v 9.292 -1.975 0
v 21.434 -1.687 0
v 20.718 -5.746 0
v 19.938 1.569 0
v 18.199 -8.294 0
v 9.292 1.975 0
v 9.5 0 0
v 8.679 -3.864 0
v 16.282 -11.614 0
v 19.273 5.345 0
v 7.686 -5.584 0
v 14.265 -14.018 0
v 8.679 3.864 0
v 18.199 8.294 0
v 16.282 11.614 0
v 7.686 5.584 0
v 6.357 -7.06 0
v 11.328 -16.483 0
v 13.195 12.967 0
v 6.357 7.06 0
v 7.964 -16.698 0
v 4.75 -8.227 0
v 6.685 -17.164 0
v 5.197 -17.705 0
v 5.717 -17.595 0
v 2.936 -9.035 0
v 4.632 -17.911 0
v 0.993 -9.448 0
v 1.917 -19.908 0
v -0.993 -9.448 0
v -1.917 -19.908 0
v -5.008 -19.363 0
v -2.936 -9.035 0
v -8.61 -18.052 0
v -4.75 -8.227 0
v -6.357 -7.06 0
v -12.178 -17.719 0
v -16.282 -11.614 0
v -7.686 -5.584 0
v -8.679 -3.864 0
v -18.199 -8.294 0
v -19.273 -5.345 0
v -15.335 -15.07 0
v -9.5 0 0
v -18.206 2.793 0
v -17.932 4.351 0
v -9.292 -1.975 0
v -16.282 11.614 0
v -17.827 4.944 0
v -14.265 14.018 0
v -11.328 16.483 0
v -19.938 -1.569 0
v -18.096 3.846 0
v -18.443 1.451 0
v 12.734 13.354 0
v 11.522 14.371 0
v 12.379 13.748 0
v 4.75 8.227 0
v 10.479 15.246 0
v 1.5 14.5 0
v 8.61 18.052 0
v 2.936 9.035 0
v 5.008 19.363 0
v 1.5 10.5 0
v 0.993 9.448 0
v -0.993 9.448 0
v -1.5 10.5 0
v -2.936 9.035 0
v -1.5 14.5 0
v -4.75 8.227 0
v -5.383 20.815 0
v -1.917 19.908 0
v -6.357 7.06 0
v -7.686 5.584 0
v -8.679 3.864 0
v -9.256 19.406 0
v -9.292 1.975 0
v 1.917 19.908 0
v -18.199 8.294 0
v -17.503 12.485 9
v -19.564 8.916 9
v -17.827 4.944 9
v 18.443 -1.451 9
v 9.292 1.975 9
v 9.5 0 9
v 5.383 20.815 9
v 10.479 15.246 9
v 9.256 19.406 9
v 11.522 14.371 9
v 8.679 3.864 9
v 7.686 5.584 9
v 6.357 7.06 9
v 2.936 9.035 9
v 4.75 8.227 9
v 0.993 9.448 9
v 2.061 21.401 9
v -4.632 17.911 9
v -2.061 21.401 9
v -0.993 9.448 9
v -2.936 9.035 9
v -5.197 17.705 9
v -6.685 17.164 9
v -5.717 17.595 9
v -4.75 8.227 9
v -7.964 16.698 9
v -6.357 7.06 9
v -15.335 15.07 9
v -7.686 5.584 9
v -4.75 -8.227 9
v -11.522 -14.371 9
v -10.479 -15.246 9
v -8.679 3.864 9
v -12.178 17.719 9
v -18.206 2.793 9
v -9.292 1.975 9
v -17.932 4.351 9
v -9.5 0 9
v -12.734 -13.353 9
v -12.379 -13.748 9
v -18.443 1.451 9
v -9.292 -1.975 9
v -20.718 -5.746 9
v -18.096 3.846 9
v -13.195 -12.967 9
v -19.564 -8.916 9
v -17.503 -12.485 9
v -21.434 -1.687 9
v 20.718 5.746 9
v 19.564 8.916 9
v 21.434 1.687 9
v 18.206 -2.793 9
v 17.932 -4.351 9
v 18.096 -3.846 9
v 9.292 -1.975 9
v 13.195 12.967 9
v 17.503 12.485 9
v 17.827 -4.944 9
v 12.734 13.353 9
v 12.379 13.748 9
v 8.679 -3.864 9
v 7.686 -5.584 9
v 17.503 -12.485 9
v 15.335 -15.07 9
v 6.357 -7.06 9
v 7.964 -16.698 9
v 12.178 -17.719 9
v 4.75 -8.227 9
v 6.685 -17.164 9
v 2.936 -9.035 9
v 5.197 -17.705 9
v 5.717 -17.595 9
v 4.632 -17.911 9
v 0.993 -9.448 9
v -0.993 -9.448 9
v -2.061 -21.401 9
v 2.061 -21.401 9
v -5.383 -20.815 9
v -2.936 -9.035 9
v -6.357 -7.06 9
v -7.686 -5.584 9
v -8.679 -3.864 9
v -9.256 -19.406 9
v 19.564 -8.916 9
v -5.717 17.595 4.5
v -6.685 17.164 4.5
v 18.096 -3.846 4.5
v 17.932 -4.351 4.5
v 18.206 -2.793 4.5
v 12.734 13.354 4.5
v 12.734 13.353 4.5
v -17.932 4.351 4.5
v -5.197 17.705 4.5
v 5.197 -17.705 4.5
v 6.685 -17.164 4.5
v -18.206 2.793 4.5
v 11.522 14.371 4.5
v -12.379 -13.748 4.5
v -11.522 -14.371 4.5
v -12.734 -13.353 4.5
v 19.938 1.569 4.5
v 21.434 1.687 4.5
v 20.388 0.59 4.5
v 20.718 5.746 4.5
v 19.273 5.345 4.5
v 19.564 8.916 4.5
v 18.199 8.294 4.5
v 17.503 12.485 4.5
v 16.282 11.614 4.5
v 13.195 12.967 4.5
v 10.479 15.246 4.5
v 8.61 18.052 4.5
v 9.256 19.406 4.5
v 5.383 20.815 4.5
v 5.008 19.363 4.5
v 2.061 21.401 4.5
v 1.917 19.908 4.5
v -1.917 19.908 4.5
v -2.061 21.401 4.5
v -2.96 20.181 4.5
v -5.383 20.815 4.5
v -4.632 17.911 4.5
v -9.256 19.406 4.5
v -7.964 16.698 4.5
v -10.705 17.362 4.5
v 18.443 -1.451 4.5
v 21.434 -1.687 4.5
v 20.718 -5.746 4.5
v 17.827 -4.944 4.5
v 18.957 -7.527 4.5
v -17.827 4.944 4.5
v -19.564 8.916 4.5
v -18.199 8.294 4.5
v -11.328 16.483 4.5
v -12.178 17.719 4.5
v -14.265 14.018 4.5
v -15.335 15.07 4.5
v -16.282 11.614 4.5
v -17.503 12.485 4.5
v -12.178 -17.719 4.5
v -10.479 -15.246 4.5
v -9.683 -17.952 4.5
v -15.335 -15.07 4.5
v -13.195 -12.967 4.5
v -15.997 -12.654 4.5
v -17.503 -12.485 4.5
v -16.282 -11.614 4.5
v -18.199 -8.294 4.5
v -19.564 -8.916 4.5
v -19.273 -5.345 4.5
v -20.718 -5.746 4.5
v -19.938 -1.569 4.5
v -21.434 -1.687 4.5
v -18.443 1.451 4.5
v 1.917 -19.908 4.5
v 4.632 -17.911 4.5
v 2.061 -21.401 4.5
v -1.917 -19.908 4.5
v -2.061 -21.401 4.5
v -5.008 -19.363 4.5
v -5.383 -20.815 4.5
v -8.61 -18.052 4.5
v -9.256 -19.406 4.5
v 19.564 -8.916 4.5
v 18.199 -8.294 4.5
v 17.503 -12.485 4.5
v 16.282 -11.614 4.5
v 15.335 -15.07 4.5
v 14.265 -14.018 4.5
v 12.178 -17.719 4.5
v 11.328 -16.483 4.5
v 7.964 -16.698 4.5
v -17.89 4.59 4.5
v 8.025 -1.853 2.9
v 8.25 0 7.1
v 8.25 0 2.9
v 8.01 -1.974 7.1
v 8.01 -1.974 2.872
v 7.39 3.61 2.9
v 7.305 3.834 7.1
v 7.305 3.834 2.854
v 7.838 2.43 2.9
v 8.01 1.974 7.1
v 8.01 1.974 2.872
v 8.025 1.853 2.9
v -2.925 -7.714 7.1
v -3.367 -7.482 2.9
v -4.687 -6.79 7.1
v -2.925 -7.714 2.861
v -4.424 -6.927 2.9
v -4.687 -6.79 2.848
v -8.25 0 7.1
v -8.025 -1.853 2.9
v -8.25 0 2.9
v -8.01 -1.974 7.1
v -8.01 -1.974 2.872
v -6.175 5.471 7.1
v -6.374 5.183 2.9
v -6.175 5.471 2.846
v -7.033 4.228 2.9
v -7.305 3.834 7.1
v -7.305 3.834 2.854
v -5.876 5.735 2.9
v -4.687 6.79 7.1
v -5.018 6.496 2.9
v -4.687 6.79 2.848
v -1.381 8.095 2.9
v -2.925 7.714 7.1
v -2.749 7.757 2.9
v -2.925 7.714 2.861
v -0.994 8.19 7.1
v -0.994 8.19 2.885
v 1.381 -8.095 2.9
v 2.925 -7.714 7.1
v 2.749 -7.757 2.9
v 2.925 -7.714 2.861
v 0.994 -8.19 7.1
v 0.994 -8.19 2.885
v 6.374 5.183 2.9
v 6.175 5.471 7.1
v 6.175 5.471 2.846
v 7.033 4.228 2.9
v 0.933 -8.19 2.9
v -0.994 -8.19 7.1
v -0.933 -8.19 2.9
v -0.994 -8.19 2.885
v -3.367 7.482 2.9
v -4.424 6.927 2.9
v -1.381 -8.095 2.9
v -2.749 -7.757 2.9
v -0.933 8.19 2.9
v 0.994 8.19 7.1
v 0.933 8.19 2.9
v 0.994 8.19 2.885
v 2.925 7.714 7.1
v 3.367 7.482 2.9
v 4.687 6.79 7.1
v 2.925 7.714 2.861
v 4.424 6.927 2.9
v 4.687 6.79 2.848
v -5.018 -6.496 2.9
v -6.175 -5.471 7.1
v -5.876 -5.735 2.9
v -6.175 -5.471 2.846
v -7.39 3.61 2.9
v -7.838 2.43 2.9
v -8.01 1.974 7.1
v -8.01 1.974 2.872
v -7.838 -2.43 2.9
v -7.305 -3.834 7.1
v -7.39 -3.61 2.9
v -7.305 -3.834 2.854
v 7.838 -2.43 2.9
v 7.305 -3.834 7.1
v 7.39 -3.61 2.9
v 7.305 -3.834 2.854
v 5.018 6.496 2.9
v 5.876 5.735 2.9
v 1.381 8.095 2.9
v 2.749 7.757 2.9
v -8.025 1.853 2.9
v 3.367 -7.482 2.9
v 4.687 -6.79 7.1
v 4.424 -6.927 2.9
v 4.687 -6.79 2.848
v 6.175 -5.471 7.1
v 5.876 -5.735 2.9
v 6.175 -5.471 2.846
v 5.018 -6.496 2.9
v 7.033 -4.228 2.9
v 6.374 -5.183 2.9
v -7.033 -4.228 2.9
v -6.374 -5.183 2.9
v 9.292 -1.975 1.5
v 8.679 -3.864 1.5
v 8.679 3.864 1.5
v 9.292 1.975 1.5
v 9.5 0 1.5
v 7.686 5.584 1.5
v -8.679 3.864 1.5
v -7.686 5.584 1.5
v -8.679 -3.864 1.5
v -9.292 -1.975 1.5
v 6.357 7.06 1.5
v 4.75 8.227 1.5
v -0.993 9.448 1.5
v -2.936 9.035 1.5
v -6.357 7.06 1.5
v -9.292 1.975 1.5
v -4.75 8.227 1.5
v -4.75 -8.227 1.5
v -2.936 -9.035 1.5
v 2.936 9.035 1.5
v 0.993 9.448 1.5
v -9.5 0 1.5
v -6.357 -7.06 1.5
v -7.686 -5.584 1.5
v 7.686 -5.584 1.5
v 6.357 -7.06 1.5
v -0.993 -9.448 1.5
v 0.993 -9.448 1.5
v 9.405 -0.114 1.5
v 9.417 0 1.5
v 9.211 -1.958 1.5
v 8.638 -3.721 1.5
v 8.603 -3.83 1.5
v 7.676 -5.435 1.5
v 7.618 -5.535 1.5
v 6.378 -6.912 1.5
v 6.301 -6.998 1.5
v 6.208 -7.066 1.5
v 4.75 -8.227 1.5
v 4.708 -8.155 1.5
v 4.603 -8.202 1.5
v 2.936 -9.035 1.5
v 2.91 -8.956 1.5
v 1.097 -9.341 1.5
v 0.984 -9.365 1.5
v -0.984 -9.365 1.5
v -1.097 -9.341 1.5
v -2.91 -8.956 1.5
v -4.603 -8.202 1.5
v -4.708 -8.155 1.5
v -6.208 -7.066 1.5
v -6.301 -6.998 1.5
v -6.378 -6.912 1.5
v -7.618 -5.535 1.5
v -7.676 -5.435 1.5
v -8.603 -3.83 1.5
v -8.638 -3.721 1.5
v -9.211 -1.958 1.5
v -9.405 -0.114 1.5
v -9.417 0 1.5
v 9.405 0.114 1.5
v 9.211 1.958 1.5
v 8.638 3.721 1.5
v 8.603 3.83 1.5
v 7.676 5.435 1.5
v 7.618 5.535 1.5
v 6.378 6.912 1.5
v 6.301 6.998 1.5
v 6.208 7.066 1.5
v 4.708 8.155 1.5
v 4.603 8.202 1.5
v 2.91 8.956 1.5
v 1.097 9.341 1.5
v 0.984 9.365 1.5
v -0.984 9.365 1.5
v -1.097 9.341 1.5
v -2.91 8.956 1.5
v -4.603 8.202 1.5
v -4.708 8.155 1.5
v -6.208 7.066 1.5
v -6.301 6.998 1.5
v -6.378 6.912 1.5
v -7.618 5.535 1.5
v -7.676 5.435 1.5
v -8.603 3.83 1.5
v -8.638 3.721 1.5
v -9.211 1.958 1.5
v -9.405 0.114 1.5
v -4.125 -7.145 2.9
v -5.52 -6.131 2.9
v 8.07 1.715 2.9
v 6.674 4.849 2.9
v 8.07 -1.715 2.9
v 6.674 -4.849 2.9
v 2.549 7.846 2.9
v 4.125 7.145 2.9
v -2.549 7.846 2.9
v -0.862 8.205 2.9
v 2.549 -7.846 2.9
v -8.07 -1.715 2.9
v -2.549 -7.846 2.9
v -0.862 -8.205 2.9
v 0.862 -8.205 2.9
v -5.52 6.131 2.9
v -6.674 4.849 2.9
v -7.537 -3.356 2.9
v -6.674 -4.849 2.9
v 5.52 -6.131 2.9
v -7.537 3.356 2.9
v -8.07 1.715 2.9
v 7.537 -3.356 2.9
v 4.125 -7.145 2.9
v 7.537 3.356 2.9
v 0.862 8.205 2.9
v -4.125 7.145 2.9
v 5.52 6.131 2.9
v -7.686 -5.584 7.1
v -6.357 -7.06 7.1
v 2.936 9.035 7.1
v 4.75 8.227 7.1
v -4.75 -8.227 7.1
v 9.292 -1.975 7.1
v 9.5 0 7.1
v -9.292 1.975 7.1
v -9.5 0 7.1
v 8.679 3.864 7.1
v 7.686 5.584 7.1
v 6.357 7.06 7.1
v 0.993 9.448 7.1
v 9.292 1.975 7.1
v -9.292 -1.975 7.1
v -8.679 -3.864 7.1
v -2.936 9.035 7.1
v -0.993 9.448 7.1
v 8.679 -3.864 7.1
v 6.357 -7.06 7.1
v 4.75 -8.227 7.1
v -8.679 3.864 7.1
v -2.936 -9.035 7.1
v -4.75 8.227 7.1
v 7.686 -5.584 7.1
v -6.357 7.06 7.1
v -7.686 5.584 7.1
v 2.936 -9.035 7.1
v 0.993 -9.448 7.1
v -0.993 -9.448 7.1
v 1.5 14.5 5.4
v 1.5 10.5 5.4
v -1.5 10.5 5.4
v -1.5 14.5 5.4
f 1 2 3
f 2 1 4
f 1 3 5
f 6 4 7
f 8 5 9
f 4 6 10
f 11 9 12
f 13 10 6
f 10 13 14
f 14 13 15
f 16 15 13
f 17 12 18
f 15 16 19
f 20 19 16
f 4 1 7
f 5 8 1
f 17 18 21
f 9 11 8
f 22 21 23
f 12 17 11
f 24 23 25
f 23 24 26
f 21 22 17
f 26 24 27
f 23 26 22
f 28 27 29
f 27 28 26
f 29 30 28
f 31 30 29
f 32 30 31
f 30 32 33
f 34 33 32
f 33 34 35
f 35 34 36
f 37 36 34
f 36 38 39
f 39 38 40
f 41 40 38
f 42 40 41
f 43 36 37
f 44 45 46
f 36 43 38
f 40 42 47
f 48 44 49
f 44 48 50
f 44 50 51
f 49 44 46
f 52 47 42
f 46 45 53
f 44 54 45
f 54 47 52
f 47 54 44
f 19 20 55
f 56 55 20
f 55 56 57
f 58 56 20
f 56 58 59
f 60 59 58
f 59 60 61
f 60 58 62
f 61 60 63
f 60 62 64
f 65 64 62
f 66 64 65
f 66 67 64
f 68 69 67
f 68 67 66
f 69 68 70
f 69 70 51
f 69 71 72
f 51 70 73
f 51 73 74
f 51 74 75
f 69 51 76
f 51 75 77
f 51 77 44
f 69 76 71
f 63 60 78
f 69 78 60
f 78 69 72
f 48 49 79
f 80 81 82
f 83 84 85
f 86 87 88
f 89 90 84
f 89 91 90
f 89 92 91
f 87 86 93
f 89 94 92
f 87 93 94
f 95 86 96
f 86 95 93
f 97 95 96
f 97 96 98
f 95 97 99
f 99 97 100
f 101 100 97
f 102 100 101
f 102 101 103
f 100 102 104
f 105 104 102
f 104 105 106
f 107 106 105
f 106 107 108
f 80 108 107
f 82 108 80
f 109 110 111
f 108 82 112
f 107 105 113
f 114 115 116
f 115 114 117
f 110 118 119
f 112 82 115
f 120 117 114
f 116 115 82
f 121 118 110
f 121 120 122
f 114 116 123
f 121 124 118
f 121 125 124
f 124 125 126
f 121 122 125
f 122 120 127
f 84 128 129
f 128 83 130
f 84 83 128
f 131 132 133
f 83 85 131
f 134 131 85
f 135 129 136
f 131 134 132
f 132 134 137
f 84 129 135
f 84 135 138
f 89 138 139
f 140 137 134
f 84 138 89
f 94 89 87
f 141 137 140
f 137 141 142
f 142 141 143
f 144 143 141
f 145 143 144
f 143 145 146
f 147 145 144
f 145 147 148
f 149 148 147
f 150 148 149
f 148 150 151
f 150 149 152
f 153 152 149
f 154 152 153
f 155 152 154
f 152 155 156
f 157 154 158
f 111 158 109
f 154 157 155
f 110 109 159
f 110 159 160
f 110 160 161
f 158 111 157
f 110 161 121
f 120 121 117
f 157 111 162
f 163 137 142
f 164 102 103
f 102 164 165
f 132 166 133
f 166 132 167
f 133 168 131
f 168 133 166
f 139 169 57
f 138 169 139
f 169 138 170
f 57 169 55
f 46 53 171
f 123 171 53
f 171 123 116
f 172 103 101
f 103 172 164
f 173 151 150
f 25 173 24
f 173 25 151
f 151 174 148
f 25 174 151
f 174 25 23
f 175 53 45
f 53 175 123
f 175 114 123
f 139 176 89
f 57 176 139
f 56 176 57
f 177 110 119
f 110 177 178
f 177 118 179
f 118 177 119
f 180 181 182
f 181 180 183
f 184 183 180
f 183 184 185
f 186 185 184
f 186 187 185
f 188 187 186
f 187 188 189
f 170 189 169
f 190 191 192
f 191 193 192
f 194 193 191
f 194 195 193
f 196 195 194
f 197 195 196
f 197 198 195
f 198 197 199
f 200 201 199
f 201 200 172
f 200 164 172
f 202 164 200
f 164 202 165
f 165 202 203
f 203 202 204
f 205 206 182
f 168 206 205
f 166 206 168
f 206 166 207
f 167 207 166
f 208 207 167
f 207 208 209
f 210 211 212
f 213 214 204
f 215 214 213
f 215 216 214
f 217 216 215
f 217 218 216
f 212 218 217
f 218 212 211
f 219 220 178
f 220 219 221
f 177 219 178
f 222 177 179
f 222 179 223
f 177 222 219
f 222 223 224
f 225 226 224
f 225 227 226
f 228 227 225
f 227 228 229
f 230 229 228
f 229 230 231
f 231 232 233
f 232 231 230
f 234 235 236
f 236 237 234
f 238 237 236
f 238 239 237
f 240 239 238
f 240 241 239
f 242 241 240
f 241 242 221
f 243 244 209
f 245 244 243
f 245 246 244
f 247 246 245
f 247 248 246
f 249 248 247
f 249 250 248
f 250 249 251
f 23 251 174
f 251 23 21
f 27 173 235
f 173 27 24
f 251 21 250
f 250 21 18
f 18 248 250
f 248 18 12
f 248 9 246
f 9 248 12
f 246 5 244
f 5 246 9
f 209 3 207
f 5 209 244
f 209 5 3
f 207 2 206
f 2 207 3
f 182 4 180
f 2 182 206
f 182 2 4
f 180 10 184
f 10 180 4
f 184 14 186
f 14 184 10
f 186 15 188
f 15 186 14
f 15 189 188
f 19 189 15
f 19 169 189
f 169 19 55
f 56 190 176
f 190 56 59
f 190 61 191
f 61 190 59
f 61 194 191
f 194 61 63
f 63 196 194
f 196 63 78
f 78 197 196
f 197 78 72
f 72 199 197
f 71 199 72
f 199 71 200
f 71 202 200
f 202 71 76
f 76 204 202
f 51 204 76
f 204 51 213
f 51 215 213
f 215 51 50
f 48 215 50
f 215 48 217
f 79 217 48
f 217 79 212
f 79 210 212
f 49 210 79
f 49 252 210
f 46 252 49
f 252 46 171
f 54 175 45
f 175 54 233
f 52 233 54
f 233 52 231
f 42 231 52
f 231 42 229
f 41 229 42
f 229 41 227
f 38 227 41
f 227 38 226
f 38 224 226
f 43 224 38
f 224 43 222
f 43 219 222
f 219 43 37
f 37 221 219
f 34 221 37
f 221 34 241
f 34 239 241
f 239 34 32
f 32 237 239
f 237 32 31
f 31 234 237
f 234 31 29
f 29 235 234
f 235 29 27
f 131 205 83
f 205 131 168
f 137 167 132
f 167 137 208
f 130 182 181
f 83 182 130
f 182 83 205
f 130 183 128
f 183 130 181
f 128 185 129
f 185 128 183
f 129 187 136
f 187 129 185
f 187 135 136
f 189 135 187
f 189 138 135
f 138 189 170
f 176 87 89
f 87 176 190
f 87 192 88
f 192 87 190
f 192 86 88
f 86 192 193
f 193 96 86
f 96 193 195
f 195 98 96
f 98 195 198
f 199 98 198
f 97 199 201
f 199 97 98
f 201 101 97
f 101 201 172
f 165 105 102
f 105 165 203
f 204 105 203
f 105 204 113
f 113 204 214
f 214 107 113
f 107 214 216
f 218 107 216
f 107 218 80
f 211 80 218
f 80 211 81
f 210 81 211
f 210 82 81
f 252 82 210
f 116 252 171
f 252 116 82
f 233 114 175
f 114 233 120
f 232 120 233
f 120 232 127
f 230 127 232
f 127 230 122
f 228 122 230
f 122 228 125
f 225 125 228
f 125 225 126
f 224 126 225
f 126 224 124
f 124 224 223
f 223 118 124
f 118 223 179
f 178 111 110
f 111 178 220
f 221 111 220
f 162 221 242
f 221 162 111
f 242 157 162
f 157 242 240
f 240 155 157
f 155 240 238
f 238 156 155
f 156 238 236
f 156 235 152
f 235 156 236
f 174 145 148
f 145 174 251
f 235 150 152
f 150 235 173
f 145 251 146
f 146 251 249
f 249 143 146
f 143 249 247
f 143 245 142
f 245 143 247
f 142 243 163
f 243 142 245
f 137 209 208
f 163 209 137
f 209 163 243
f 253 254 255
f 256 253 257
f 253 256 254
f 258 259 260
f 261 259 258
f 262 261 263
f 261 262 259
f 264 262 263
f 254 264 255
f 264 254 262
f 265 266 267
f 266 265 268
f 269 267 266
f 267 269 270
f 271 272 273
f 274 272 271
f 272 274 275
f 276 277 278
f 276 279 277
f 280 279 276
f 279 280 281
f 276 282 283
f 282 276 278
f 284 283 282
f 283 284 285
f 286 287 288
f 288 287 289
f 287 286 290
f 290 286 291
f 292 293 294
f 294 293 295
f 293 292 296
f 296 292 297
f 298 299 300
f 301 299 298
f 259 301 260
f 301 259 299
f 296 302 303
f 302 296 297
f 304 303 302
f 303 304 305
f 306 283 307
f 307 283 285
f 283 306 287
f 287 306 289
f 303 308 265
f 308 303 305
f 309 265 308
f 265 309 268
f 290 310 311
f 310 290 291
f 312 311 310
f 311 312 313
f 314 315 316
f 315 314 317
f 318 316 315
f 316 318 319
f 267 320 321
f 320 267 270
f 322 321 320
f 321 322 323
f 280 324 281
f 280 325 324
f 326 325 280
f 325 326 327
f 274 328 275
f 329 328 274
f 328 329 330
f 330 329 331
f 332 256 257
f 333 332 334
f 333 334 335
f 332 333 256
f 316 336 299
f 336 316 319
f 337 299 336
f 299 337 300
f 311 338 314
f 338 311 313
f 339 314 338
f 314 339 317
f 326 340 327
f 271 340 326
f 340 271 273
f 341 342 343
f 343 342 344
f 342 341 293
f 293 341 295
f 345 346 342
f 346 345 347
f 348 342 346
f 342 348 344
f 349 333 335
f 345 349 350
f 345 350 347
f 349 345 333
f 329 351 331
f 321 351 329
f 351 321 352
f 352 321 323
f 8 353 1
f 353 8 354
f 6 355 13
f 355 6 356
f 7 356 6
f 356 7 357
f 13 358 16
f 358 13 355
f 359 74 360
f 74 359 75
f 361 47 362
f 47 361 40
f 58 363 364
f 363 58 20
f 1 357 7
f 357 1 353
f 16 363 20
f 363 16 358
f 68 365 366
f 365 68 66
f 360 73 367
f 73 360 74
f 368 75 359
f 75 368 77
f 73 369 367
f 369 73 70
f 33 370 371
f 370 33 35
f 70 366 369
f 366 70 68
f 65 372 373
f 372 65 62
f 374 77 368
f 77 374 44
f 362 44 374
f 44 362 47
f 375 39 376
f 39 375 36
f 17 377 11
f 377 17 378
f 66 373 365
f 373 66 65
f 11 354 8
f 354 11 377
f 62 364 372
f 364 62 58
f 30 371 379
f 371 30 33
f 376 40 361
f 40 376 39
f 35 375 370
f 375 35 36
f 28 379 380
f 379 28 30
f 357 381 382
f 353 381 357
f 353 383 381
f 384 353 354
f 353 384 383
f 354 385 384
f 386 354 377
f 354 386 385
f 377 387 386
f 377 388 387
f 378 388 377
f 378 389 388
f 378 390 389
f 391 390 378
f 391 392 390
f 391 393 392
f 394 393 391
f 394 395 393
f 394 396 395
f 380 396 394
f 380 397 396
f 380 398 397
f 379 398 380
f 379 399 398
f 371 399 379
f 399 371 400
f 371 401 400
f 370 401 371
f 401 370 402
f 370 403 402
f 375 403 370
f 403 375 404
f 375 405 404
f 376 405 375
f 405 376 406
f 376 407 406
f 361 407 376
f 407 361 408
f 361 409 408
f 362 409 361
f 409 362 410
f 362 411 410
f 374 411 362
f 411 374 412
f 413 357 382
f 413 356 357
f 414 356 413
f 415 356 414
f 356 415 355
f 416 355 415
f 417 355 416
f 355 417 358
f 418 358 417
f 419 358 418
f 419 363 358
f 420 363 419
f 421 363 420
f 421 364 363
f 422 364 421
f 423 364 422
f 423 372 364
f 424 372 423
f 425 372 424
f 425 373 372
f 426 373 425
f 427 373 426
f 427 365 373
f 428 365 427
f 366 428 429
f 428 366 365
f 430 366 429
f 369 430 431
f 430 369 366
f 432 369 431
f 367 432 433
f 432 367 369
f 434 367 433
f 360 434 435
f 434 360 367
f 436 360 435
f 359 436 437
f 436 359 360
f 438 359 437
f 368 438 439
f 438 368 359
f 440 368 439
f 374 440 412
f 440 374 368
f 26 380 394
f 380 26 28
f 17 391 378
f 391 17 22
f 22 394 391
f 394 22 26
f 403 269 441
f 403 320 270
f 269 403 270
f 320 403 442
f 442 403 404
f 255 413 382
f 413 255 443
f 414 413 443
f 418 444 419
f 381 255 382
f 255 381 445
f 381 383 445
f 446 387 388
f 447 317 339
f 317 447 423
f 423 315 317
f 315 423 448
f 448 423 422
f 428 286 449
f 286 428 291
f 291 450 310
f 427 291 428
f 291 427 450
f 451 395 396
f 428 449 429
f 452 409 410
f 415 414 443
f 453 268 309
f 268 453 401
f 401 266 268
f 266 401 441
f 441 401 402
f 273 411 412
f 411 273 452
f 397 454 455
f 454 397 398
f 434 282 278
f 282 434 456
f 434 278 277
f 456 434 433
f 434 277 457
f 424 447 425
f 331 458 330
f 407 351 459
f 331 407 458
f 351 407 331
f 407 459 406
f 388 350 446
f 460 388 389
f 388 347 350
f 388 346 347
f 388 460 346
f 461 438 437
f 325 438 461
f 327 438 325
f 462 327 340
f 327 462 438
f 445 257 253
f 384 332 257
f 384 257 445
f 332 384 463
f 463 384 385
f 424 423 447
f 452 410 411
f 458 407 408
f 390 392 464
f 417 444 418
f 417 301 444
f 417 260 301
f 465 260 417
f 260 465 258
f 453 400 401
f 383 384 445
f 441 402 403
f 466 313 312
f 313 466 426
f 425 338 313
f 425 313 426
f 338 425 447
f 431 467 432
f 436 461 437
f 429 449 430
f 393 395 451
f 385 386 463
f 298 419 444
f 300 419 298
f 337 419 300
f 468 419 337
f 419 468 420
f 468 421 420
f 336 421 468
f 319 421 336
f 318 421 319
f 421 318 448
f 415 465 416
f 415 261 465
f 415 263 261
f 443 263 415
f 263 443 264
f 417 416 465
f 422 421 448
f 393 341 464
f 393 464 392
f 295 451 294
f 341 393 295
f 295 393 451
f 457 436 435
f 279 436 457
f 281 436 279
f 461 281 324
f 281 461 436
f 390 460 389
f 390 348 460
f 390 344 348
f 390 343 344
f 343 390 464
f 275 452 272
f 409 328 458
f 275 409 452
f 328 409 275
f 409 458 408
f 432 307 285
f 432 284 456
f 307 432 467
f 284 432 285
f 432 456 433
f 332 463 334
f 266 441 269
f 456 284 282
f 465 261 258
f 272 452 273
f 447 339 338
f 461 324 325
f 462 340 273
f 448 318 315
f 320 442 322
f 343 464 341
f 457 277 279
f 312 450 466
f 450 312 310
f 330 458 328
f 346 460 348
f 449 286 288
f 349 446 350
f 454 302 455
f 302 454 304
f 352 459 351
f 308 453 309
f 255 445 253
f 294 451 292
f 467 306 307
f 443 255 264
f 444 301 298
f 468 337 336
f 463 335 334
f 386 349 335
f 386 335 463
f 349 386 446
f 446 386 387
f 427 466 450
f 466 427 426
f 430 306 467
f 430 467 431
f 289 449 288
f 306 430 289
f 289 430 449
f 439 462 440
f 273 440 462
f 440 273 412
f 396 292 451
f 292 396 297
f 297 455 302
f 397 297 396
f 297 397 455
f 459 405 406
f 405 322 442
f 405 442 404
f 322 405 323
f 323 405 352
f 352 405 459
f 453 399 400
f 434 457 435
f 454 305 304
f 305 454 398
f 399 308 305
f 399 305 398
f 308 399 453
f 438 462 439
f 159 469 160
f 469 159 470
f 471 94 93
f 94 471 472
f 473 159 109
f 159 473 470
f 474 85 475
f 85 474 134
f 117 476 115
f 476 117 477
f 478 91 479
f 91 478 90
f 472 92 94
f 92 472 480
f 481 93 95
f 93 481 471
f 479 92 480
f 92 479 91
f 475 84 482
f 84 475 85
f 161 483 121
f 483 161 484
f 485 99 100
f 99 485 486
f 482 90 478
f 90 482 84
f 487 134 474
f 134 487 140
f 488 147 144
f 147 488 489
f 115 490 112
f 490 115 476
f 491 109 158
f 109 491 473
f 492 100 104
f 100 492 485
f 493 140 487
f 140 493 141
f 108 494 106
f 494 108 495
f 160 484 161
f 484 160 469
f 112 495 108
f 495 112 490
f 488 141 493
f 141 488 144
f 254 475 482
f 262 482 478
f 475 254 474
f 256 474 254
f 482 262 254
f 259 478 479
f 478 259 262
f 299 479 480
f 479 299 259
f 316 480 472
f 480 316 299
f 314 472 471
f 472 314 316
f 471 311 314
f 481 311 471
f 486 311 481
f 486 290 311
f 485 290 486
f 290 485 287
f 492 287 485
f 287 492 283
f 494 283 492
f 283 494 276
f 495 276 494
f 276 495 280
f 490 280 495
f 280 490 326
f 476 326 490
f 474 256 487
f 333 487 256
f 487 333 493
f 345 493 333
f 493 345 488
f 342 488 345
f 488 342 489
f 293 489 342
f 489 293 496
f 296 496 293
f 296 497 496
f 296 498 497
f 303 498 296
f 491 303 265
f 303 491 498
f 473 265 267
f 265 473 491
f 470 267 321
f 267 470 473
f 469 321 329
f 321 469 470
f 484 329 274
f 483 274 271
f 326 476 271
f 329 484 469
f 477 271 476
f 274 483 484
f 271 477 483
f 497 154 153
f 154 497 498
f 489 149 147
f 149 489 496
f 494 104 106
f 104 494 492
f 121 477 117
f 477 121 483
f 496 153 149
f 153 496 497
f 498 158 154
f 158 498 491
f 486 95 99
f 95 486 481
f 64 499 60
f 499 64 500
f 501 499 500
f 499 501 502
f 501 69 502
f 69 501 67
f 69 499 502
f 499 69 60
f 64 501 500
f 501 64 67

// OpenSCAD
// file: Cam-as-18-Sided-Polygon.scad
/*  Provides a common method / function / module to 3D Print an 18 sided polygon for a cam used by Elna Supermatic, Elna SU machines sewing machines, matching with the 18 punches made by the needle per each rotation of a cam.

    Copyright (C) 2020  L Komandur

    This program is free software: you can redistribute it and/or modify
    it under the terms of the GNU General Public License as published by
    the Free Software Foundation, either version 3 of the License, or
    (at your option) any later version.

    This program is distributed in the hope that it will be useful,
    but WITHOUT ANY WARRANTY; without even the implied warranty of
    MERCHANTABILITY or FITNESS FOR A PARTICULAR PURPOSE.  See the
    GNU General Public License for more details.

    You should have received a copy of the GNU General Public License
    along with this program.  If not, see <https://www.gnu.org/licenses/>.
*/

thickest_cyl_rad = 17;
skirting_width=1.5;

angle_of_side = 11;
min_radius = thickest_cyl_rad+skirting_width;

module plotpoly(p1,p2,p3,p4,p5,p6,p7,p8,p9,p10,p11,p12,p13,p14,p15,p16,p17,p18) {
	//scale ([-1,1])
	polygon( points = [
	[(min_radius + p1)*sin(0-angle_of_side/2), (min_radius + p1)*cos(0-angle_of_side/2)],
	[(min_radius + p1)*sin(0+angle_of_side/2), (min_radius + p1)*cos(0+angle_of_side/2)],
	[(min_radius + p2)*sin(20-angle_of_side/2), (min_radius + p2)*cos(20-angle_of_side/2)],	
	[(min_radius + p2)*sin(20+angle_of_side/2), (min_radius + p2)*cos(20+angle_of_side/2)],	
	[(min_radius + p3)*sin(40-angle_of_side/2), (min_radius + p3)*cos(40-angle_of_side/2)],	
	[(min_radius + p3)*sin(40+angle_of_side/2), (min_radius + p3)*cos(40+angle_of_side/2)],	
	[(min_radius + p4)*sin(60-angle_of_side/2), (min_radius + p4)*cos(60-angle_of_side/2)],	
	[(min_radius + p4)*sin(60+angle_of_side/2), (min_radius + p4)*cos(60+angle_of_side/2)],	
	[(min_radius + p5)*sin(80-angle_of_side/2), (min_radius + p5)*cos(80-angle_of_side/2)],	
	[(min_radius + p5)*sin(80+angle_of_side/2), (min_radius + p5)*cos(80+angle_of_side/2)],	
	[(min_radius + p6)*sin(100-angle_of_side/2), (min_radius + p6)*cos(100-angle_of_side/2)],	
	[(min_radius + p6)*sin(100+angle_of_side/2), (min_radius + p6)*cos(100+angle_of_side/2)],	
	[(min_radius + p7)*sin(120-angle_of_side/2), (min_radius + p7)*cos(120-angle_of_side/2)],	
	[(min_radius + p7)*sin(120+angle_of_side/2), (min_radius + p7)*cos(120+angle_of_side/2)],	
	[(min_radius + p8)*sin(140-angle_of_side/2), (min_radius + p8)*cos(140-angle_of_side/2)],	
	[(min_radius + p8)*sin(140+angle_of_side/2), (min_radius + p8)*cos(140+angle_of_side/2)],	
	[(min_radius + p9)*sin(160-angle_of_side/2), (min_radius + p9)*cos(160-angle_of_side/2)],	
	[(min_radius + p9)*sin(160+angle_of_side/2), (min_radius + p9)*cos(160+angle_of_side/2)],	
	[(min_radius + p10)*sin(180-angle_of_side/2), (min_radius + p10)*cos(180-angle_of_side/2)],	
	[(min_radius + p10)*sin(180+angle_of_side/2), (min_radius + p10)*cos(180+angle_of_side/2)],	
	[(min_radius + p11)*sin(200-angle_of_side/2), (min_radius + p11)*cos(200-angle_of_side/2)],	
	[(min_radius + p11)*sin(200+angle_of_side/2), (min_radius + p11)*cos(200+angle_of_side/2)],	
	[(min_radius + p12)*sin(220-angle_of_side/2), (min_radius + p12)*cos(220-angle_of_side/2)],	
	[(min_radius + p12)*sin(220+angle_of_side/2), (min_radius + p12)*cos(220+angle_of_side/2)],	
	[(min_radius + p13)*sin(240-angle_of_side/2), (min_radius + p13)*cos(240-angle_of_side/2)],	
	[(min_radius + p13)*sin(240+angle_of_side/2), (min_radius + p13)*cos(240+angle_of_side/2)],	
	[(min_radius + p14)*sin(260-angle_of_side/2), (min_radius + p14)*cos(260-angle_of_side/2)],	
	[(min_radius + p14)*sin(260+angle_of_side/2), (min_radius + p14)*cos(260+angle_of_side/2)],	
	[(min_radius + p15)*sin(280-angle_of_side/2), (min_radius + p15)*cos(280-angle_of_side/2)],	
	[(min_radius + p15)*sin(280+angle_of_side/2), (min_radius + p15)*cos(280+angle_of_side/2)],	
	[(min_radius + p16)*sin(300-angle_of_side/2), (min_radius + p16)*cos(300-angle_of_side/2)],		
	[(min_radius + p16)*sin(300+angle_of_side/2), (min_radius + p16)*cos(300+angle_of_side/2)],		
	[(min_radius + p17)*sin(320-angle_of_side/2), (min_radius + p17)*cos(320-angle_of_side/2)],	
	[(min_radius + p17)*sin(320+angle_of_side/2), (min_radius + p17)*cos(320+angle_of_side/2)],	
	[(min_radius + p18)*sin(340-angle_of_side/2), (min_radius + p18)*cos(340-angle_of_side/2)],
	[(min_radius + p18)*sin(340+angle_of_side/2), (min_radius + p18)*cos(340+angle_of_side/2)]
	]);

}
// main file
/*  3D Prints a "double cam" similar to Cam No 107 of Elna Supermatic, Elna SU machines sewing machines.

    Copyright (C) 2020  L Komandur

    This program is free software: you can redistribute it and/or modify
    it under the terms of the GNU General Public License as published by
    the Free Software Foundation, either version 3 of the License, or
    (at your option) any later version.

    This program is distributed in the hope that it will be useful,
    but WITHOUT ANY WARRANTY; without even the implied warranty of
    MERCHANTABILITY or FITNESS FOR A PARTICULAR PURPOSE.  See the
    GNU General Public License for more details.

    You should have received a copy of the GNU General Public License
    along with this program.  If not, see <https://www.gnu.org/licenses/>.
*/

use <Cam-as-18-Sided-Polygon.scad>

double_disc_thickness = 9;

disc_thickness = 9; // 7 for single, 9 for double
thickest_cyl_rad = 17;

lobe_thickness = 4.5;
inner_hole_rad = 8.25;
hole_bigger_rad = 9.5;
bigger_hole_ht = 1.5;
cut_errors = 0.1;
hole_cone_ht = 1.5;
skirting = 0;


gap_bet_cloth_needle_cams = disc_thickness-2*skirting-2*lobe_thickness;

gap_to_transporthole = 1;

transporthole_width = 3;
transporthole_depth = 5.5;
transporthole_length  = 4;

peak=3;
c=peak/2;
l=0;
r=peak;
cl=peak/4;
cr=peak*3/4;
skirting_width=1.5;
min_radius = thickest_cyl_rad+skirting_width;
phase_diff = 60;

module letter(l,font="font.dxf",h=100,i=0) {
	union() {
		linear_extrude( height=h) import(font, layer=l[i]);
		translate([dxf_dim(file=font, name="advx",layer=l[i]),
			dxf_dim(file=font, name="advy",layer=l[i]),
			0])
			child();
	}
}

module word(wrd,font="font.dxf",h=100,i=0) {
	if(i < len(wrd)) {
		letter(wrd,font,h,i) word(wrd,font,h,i+1);
	} else {
		child();
	}
}


module print_d107_cam(x,y) {

	translate([x, y, 0]) rotate(a=[0,0,0]) difference() {
		union() {
			// tall INNER tall cylinder that excludes skirting 
		cylinder(h = disc_thickness, r = thickest_cyl_rad);
	
			// 2nd bigger cylinder shared between 2 cams and skirting; any sewing information would go here.
	
		translate([0, 0, skirting]) cylinder(h = disc_thickness - skirting*2, r = thickest_cyl_rad + skirting_width);
		translate([0, 0, skirting])
		linear_extrude (height  = lobe_thickness)
			plotpoly(c,c,l,c,c,r,c,c,l,c,c,r,c,c,l,c,c,r);
		
		// Upper cam for cloth movement
		rotate(a=[0,0,phase_diff])
		translate([0, 0, lobe_thickness])
		linear_extrude (height  = lobe_thickness)
			plotpoly(r,r,l,r,r,l,r,r,l,r,r,l,r,r,l,r,r,l);
		
	
		}
	
		// Subtract the inner hole. Be very generous.
		translate([0, 0, disc_thickness/2])
			cylinder(h = disc_thickness+1, r = inner_hole_rad, center = true);
	
		// Subtract the lower wider hole
		translate([0, 0, -cut_errors])
			cylinder(h = bigger_hole_ht+cut_errors, r = hole_bigger_rad);
	
	
		// Subtract the cone between wide hole and smaller hole.
		translate([0, 0, bigger_hole_ht-cut_errors])
			cylinder(h = hole_cone_ht, r1 = hole_bigger_rad, r2 = inner_hole_rad);
	
		// Subtract the upper cone the disk locks on the sewing machine post (only for double cams).
		translate([0, 0, double_disc_thickness-skirting-2+cut_errors])
			cylinder(h = 2, r = hole_bigger_rad);
	
		// Initials on the side of transport hole as depressions (top side while printing).
	
		for (letter_depth = [1:6])
		{
			rotate(a=[0, 0, 0]) translate([-2.25, 10.5, disc_thickness-0.1*letter_depth]) scale(0.0015) letter("O");
			rotate(a=[0, 0, 0]) translate([-1.5, 11.25, disc_thickness-0.1*letter_depth]) scale(0.001) letter("O");
			rotate(a=[0, 0, 140]) translate([-8, 10, disc_thickness-0.1*letter_depth]) scale(0.002) letter("E");
			rotate(a=[0, 0, 130]) translate([-4, 11, disc_thickness-0.1*letter_depth]) scale(0.002) letter("L");
			rotate(a=[0, 0, 120]) translate([-0, 11, disc_thickness-0.1*letter_depth]) scale(0.002) letter("N");
			rotate(a=[0, 0, 110]) translate([4, 10, disc_thickness-0.1*letter_depth]) scale(0.002) letter("A");

			rotate(a=[0, 0, 115]) translate([-8, -16, disc_thickness-0.1*letter_depth]) scale(0.002) letter("1");
			rotate(a=[0, 0, 115]) translate([-3, -17, disc_thickness-0.1*letter_depth]) scale(0.002) letter("0");
			rotate(a=[0, 0, 115]) translate([2, -17,disc_thickness-0.1*letter_depth]) scale(0.002) letter("7");
		}
		// Transport hole made as a rectangular  hole
		difference() {
			rotate(a=[0, 0, 0]) translate([0, hole_bigger_rad + gap_to_transporthole + transporthole_length/2, transporthole_depth/2-cut_errors])
				cube(size = [transporthole_width, transporthole_length, transporthole_depth], center = true);
	
		}
	}
}

print_d107_cam(0,0);
